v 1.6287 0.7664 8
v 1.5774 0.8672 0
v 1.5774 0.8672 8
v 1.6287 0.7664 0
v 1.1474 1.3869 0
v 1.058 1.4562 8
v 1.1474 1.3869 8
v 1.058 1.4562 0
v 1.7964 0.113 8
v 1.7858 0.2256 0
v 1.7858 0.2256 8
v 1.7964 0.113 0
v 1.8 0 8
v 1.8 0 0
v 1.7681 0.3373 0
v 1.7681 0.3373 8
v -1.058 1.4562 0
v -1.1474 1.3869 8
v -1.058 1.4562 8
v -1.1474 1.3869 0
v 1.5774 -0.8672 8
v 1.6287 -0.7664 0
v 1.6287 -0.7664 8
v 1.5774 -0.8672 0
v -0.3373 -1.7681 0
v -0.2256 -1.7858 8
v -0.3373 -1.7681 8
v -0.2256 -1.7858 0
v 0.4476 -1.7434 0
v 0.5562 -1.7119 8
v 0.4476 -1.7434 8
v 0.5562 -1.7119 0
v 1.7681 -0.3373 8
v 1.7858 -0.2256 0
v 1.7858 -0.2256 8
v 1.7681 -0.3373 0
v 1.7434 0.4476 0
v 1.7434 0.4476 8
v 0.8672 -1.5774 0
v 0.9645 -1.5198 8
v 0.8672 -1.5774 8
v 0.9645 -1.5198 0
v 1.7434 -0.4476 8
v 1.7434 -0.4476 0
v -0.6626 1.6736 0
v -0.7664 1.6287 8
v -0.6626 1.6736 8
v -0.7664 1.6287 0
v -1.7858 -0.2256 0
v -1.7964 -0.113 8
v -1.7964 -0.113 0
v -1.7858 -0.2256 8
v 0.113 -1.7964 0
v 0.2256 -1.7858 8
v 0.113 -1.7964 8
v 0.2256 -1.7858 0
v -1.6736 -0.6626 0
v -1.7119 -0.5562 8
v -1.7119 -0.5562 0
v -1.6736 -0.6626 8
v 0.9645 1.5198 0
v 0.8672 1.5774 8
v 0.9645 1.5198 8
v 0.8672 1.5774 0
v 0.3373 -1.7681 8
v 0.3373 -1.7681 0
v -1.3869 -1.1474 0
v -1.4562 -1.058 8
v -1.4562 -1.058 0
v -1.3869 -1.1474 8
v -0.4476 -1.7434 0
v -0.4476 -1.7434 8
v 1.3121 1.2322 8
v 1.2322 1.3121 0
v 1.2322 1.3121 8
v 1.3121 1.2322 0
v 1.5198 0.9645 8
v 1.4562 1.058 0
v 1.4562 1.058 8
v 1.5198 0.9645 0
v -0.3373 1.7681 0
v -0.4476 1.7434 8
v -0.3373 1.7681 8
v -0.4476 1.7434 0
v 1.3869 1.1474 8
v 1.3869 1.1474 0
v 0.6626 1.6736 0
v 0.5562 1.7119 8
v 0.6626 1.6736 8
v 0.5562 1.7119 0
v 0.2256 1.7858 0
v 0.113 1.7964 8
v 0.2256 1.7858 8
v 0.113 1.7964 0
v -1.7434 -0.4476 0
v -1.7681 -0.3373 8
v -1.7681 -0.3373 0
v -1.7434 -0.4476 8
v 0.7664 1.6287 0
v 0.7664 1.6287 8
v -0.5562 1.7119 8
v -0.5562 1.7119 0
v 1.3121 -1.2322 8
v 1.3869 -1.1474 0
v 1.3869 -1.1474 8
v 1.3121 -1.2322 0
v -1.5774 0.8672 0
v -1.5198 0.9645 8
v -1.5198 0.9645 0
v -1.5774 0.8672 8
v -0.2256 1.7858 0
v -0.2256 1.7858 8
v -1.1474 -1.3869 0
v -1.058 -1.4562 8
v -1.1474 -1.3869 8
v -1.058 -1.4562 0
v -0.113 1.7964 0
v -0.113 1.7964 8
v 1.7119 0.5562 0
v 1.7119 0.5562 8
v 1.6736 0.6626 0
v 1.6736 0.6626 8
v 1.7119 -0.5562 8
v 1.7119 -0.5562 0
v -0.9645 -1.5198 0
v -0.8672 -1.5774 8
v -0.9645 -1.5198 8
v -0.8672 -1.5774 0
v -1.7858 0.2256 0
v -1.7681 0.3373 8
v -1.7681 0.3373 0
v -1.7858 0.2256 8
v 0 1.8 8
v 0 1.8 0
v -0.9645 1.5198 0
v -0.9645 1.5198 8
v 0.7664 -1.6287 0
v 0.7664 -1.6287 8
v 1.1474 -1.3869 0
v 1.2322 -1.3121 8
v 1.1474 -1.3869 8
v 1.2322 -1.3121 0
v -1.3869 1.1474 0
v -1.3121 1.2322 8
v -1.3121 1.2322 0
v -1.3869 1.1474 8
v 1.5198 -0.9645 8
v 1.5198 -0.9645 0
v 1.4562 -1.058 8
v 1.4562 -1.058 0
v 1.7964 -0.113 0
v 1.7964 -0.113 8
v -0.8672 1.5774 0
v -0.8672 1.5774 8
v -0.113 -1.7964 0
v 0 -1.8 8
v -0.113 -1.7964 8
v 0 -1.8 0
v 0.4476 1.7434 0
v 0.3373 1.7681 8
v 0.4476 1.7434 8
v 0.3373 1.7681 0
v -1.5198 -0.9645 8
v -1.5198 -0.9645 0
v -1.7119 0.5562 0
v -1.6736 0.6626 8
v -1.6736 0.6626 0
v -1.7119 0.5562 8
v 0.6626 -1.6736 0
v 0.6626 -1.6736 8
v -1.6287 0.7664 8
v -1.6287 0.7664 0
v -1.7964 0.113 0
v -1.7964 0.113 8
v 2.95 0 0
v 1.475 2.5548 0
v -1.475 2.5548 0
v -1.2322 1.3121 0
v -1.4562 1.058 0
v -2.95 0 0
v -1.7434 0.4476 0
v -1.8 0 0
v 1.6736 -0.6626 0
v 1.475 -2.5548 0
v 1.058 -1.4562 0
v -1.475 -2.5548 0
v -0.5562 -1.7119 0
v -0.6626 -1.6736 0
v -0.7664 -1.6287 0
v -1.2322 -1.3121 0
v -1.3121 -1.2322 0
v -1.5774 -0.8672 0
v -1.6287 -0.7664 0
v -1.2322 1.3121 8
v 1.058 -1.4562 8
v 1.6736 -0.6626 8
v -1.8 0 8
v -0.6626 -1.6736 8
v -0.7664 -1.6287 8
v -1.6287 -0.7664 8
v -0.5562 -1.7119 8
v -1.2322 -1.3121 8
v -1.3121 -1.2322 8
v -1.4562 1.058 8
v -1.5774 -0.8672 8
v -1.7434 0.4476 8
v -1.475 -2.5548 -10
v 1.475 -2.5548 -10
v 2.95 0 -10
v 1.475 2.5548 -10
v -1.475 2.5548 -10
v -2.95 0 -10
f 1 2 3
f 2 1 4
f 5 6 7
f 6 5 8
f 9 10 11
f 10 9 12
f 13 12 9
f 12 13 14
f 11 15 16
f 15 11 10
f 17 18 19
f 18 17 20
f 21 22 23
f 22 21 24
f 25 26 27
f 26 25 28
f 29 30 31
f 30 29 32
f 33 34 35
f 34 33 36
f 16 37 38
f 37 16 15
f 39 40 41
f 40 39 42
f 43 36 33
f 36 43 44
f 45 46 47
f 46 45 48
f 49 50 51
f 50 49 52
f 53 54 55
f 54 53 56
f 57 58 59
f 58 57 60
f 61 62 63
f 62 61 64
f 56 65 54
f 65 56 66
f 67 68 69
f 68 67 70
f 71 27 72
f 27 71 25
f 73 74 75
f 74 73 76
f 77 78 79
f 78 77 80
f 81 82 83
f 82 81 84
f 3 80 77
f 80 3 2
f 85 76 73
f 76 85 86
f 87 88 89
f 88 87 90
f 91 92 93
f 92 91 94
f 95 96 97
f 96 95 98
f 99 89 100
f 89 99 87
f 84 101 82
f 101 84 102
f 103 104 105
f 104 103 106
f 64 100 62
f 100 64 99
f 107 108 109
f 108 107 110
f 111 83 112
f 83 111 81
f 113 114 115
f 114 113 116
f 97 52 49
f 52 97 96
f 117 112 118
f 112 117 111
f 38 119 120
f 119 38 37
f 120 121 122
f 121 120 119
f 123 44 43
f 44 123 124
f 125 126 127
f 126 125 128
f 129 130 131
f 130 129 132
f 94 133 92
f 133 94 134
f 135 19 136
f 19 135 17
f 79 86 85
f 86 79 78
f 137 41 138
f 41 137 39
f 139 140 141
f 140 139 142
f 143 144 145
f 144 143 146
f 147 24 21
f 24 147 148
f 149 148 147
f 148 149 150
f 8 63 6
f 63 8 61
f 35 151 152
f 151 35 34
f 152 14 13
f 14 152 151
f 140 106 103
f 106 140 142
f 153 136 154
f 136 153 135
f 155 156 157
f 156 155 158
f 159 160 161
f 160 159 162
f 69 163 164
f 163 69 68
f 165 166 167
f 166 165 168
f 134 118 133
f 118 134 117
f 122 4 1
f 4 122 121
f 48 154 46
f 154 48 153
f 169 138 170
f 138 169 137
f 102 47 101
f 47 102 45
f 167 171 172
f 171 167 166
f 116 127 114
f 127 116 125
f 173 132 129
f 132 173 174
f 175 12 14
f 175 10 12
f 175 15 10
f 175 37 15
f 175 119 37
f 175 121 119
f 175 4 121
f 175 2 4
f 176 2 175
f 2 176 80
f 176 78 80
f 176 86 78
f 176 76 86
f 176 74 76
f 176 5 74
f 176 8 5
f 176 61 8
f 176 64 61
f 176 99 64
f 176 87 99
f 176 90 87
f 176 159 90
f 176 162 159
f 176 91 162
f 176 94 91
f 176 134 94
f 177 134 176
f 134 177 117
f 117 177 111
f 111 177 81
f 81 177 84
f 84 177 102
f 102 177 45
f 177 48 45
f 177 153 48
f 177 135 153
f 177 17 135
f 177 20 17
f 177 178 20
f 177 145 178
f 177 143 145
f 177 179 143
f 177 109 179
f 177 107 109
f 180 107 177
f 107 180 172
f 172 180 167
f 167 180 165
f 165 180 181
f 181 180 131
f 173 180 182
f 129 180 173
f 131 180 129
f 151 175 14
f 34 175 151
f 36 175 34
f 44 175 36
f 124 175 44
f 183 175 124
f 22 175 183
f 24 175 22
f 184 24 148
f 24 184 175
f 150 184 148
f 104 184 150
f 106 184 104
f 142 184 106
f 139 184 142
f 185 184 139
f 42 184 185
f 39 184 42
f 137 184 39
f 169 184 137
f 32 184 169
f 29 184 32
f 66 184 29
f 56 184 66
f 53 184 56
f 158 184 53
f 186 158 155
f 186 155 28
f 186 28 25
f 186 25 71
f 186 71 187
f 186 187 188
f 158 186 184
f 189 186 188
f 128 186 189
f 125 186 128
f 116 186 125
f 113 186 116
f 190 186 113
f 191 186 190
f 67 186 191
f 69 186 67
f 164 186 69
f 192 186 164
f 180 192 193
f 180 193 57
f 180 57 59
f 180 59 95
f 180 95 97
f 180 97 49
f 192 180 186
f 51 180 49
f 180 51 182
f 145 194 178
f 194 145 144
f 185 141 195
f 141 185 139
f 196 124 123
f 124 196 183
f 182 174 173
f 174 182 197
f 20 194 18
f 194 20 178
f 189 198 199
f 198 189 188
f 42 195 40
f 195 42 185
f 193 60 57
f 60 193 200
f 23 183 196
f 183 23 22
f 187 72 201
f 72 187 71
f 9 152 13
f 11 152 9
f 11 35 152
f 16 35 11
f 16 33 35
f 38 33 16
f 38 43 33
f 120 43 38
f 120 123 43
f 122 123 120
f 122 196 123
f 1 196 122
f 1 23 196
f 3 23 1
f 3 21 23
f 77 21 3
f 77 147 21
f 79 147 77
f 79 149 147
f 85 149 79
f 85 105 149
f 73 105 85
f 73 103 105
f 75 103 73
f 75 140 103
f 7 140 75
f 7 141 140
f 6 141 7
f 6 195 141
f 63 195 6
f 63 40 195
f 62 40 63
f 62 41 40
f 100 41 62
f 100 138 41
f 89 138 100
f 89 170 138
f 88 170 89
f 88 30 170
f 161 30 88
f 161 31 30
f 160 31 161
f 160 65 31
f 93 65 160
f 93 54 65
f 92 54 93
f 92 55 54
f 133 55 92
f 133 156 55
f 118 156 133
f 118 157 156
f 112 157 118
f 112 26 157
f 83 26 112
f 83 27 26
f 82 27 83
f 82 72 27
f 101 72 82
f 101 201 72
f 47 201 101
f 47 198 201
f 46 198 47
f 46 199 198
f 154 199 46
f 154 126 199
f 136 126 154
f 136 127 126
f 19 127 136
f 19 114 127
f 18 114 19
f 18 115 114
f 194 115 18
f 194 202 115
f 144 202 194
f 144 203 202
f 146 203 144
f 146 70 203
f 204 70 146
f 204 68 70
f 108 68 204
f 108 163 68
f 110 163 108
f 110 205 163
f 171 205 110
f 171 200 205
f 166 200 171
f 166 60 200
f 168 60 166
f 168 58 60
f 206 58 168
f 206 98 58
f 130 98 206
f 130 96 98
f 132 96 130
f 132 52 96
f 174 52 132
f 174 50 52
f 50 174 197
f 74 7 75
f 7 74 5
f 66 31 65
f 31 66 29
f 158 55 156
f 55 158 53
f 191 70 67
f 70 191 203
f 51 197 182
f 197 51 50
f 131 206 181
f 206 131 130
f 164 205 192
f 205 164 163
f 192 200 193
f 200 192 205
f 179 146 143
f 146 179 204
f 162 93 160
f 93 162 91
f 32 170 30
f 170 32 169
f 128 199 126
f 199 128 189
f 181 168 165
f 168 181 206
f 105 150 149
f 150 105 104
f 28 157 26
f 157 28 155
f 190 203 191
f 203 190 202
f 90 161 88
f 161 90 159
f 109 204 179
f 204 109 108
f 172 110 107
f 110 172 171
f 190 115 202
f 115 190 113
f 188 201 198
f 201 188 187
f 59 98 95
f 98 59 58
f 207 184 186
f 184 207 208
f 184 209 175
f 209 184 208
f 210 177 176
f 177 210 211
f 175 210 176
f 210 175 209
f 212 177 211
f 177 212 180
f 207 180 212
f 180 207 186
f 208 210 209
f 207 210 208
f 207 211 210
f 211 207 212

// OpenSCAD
// Hex Spacers

tolerance = 0.3;
$fn = $preview ? 20 : 100;

module spacer(m=3) {
    dims = [
        [2, 3.3],
        [2.5, 5.3],
        [3, 5.3],
        [4, 6.7],
        [5, 8],
        [6, 9]
    ];

    n = dims[search(m, dims)[0]][1];
    
    echo("N: ", n);
    cylinder(r = m/2 + tolerance, h = 8);
    
    translate([0, 0, -10])
    union() {        
        cylinder(r = n/2 + tolerance, h = 10, $fn=6);
    }
}

spacer();
